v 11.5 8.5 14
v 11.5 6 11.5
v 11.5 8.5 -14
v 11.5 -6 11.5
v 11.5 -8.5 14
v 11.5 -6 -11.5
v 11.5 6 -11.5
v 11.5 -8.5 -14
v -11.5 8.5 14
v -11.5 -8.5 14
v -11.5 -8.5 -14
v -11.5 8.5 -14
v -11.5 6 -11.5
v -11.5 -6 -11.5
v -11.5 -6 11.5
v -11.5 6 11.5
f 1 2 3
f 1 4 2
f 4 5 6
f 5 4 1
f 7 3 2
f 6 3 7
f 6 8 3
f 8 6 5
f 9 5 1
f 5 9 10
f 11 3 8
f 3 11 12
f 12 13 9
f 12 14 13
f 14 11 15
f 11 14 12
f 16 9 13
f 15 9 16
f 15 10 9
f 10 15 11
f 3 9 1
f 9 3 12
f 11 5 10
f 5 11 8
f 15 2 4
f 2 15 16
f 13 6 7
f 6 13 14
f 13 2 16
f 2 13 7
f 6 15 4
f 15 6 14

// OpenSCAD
HEIGHT = 23;
WIDTH = 12;

difference() {
cube(size = [23,17,28], center = true);
cube(size = [26,12,23], center = true);
}
